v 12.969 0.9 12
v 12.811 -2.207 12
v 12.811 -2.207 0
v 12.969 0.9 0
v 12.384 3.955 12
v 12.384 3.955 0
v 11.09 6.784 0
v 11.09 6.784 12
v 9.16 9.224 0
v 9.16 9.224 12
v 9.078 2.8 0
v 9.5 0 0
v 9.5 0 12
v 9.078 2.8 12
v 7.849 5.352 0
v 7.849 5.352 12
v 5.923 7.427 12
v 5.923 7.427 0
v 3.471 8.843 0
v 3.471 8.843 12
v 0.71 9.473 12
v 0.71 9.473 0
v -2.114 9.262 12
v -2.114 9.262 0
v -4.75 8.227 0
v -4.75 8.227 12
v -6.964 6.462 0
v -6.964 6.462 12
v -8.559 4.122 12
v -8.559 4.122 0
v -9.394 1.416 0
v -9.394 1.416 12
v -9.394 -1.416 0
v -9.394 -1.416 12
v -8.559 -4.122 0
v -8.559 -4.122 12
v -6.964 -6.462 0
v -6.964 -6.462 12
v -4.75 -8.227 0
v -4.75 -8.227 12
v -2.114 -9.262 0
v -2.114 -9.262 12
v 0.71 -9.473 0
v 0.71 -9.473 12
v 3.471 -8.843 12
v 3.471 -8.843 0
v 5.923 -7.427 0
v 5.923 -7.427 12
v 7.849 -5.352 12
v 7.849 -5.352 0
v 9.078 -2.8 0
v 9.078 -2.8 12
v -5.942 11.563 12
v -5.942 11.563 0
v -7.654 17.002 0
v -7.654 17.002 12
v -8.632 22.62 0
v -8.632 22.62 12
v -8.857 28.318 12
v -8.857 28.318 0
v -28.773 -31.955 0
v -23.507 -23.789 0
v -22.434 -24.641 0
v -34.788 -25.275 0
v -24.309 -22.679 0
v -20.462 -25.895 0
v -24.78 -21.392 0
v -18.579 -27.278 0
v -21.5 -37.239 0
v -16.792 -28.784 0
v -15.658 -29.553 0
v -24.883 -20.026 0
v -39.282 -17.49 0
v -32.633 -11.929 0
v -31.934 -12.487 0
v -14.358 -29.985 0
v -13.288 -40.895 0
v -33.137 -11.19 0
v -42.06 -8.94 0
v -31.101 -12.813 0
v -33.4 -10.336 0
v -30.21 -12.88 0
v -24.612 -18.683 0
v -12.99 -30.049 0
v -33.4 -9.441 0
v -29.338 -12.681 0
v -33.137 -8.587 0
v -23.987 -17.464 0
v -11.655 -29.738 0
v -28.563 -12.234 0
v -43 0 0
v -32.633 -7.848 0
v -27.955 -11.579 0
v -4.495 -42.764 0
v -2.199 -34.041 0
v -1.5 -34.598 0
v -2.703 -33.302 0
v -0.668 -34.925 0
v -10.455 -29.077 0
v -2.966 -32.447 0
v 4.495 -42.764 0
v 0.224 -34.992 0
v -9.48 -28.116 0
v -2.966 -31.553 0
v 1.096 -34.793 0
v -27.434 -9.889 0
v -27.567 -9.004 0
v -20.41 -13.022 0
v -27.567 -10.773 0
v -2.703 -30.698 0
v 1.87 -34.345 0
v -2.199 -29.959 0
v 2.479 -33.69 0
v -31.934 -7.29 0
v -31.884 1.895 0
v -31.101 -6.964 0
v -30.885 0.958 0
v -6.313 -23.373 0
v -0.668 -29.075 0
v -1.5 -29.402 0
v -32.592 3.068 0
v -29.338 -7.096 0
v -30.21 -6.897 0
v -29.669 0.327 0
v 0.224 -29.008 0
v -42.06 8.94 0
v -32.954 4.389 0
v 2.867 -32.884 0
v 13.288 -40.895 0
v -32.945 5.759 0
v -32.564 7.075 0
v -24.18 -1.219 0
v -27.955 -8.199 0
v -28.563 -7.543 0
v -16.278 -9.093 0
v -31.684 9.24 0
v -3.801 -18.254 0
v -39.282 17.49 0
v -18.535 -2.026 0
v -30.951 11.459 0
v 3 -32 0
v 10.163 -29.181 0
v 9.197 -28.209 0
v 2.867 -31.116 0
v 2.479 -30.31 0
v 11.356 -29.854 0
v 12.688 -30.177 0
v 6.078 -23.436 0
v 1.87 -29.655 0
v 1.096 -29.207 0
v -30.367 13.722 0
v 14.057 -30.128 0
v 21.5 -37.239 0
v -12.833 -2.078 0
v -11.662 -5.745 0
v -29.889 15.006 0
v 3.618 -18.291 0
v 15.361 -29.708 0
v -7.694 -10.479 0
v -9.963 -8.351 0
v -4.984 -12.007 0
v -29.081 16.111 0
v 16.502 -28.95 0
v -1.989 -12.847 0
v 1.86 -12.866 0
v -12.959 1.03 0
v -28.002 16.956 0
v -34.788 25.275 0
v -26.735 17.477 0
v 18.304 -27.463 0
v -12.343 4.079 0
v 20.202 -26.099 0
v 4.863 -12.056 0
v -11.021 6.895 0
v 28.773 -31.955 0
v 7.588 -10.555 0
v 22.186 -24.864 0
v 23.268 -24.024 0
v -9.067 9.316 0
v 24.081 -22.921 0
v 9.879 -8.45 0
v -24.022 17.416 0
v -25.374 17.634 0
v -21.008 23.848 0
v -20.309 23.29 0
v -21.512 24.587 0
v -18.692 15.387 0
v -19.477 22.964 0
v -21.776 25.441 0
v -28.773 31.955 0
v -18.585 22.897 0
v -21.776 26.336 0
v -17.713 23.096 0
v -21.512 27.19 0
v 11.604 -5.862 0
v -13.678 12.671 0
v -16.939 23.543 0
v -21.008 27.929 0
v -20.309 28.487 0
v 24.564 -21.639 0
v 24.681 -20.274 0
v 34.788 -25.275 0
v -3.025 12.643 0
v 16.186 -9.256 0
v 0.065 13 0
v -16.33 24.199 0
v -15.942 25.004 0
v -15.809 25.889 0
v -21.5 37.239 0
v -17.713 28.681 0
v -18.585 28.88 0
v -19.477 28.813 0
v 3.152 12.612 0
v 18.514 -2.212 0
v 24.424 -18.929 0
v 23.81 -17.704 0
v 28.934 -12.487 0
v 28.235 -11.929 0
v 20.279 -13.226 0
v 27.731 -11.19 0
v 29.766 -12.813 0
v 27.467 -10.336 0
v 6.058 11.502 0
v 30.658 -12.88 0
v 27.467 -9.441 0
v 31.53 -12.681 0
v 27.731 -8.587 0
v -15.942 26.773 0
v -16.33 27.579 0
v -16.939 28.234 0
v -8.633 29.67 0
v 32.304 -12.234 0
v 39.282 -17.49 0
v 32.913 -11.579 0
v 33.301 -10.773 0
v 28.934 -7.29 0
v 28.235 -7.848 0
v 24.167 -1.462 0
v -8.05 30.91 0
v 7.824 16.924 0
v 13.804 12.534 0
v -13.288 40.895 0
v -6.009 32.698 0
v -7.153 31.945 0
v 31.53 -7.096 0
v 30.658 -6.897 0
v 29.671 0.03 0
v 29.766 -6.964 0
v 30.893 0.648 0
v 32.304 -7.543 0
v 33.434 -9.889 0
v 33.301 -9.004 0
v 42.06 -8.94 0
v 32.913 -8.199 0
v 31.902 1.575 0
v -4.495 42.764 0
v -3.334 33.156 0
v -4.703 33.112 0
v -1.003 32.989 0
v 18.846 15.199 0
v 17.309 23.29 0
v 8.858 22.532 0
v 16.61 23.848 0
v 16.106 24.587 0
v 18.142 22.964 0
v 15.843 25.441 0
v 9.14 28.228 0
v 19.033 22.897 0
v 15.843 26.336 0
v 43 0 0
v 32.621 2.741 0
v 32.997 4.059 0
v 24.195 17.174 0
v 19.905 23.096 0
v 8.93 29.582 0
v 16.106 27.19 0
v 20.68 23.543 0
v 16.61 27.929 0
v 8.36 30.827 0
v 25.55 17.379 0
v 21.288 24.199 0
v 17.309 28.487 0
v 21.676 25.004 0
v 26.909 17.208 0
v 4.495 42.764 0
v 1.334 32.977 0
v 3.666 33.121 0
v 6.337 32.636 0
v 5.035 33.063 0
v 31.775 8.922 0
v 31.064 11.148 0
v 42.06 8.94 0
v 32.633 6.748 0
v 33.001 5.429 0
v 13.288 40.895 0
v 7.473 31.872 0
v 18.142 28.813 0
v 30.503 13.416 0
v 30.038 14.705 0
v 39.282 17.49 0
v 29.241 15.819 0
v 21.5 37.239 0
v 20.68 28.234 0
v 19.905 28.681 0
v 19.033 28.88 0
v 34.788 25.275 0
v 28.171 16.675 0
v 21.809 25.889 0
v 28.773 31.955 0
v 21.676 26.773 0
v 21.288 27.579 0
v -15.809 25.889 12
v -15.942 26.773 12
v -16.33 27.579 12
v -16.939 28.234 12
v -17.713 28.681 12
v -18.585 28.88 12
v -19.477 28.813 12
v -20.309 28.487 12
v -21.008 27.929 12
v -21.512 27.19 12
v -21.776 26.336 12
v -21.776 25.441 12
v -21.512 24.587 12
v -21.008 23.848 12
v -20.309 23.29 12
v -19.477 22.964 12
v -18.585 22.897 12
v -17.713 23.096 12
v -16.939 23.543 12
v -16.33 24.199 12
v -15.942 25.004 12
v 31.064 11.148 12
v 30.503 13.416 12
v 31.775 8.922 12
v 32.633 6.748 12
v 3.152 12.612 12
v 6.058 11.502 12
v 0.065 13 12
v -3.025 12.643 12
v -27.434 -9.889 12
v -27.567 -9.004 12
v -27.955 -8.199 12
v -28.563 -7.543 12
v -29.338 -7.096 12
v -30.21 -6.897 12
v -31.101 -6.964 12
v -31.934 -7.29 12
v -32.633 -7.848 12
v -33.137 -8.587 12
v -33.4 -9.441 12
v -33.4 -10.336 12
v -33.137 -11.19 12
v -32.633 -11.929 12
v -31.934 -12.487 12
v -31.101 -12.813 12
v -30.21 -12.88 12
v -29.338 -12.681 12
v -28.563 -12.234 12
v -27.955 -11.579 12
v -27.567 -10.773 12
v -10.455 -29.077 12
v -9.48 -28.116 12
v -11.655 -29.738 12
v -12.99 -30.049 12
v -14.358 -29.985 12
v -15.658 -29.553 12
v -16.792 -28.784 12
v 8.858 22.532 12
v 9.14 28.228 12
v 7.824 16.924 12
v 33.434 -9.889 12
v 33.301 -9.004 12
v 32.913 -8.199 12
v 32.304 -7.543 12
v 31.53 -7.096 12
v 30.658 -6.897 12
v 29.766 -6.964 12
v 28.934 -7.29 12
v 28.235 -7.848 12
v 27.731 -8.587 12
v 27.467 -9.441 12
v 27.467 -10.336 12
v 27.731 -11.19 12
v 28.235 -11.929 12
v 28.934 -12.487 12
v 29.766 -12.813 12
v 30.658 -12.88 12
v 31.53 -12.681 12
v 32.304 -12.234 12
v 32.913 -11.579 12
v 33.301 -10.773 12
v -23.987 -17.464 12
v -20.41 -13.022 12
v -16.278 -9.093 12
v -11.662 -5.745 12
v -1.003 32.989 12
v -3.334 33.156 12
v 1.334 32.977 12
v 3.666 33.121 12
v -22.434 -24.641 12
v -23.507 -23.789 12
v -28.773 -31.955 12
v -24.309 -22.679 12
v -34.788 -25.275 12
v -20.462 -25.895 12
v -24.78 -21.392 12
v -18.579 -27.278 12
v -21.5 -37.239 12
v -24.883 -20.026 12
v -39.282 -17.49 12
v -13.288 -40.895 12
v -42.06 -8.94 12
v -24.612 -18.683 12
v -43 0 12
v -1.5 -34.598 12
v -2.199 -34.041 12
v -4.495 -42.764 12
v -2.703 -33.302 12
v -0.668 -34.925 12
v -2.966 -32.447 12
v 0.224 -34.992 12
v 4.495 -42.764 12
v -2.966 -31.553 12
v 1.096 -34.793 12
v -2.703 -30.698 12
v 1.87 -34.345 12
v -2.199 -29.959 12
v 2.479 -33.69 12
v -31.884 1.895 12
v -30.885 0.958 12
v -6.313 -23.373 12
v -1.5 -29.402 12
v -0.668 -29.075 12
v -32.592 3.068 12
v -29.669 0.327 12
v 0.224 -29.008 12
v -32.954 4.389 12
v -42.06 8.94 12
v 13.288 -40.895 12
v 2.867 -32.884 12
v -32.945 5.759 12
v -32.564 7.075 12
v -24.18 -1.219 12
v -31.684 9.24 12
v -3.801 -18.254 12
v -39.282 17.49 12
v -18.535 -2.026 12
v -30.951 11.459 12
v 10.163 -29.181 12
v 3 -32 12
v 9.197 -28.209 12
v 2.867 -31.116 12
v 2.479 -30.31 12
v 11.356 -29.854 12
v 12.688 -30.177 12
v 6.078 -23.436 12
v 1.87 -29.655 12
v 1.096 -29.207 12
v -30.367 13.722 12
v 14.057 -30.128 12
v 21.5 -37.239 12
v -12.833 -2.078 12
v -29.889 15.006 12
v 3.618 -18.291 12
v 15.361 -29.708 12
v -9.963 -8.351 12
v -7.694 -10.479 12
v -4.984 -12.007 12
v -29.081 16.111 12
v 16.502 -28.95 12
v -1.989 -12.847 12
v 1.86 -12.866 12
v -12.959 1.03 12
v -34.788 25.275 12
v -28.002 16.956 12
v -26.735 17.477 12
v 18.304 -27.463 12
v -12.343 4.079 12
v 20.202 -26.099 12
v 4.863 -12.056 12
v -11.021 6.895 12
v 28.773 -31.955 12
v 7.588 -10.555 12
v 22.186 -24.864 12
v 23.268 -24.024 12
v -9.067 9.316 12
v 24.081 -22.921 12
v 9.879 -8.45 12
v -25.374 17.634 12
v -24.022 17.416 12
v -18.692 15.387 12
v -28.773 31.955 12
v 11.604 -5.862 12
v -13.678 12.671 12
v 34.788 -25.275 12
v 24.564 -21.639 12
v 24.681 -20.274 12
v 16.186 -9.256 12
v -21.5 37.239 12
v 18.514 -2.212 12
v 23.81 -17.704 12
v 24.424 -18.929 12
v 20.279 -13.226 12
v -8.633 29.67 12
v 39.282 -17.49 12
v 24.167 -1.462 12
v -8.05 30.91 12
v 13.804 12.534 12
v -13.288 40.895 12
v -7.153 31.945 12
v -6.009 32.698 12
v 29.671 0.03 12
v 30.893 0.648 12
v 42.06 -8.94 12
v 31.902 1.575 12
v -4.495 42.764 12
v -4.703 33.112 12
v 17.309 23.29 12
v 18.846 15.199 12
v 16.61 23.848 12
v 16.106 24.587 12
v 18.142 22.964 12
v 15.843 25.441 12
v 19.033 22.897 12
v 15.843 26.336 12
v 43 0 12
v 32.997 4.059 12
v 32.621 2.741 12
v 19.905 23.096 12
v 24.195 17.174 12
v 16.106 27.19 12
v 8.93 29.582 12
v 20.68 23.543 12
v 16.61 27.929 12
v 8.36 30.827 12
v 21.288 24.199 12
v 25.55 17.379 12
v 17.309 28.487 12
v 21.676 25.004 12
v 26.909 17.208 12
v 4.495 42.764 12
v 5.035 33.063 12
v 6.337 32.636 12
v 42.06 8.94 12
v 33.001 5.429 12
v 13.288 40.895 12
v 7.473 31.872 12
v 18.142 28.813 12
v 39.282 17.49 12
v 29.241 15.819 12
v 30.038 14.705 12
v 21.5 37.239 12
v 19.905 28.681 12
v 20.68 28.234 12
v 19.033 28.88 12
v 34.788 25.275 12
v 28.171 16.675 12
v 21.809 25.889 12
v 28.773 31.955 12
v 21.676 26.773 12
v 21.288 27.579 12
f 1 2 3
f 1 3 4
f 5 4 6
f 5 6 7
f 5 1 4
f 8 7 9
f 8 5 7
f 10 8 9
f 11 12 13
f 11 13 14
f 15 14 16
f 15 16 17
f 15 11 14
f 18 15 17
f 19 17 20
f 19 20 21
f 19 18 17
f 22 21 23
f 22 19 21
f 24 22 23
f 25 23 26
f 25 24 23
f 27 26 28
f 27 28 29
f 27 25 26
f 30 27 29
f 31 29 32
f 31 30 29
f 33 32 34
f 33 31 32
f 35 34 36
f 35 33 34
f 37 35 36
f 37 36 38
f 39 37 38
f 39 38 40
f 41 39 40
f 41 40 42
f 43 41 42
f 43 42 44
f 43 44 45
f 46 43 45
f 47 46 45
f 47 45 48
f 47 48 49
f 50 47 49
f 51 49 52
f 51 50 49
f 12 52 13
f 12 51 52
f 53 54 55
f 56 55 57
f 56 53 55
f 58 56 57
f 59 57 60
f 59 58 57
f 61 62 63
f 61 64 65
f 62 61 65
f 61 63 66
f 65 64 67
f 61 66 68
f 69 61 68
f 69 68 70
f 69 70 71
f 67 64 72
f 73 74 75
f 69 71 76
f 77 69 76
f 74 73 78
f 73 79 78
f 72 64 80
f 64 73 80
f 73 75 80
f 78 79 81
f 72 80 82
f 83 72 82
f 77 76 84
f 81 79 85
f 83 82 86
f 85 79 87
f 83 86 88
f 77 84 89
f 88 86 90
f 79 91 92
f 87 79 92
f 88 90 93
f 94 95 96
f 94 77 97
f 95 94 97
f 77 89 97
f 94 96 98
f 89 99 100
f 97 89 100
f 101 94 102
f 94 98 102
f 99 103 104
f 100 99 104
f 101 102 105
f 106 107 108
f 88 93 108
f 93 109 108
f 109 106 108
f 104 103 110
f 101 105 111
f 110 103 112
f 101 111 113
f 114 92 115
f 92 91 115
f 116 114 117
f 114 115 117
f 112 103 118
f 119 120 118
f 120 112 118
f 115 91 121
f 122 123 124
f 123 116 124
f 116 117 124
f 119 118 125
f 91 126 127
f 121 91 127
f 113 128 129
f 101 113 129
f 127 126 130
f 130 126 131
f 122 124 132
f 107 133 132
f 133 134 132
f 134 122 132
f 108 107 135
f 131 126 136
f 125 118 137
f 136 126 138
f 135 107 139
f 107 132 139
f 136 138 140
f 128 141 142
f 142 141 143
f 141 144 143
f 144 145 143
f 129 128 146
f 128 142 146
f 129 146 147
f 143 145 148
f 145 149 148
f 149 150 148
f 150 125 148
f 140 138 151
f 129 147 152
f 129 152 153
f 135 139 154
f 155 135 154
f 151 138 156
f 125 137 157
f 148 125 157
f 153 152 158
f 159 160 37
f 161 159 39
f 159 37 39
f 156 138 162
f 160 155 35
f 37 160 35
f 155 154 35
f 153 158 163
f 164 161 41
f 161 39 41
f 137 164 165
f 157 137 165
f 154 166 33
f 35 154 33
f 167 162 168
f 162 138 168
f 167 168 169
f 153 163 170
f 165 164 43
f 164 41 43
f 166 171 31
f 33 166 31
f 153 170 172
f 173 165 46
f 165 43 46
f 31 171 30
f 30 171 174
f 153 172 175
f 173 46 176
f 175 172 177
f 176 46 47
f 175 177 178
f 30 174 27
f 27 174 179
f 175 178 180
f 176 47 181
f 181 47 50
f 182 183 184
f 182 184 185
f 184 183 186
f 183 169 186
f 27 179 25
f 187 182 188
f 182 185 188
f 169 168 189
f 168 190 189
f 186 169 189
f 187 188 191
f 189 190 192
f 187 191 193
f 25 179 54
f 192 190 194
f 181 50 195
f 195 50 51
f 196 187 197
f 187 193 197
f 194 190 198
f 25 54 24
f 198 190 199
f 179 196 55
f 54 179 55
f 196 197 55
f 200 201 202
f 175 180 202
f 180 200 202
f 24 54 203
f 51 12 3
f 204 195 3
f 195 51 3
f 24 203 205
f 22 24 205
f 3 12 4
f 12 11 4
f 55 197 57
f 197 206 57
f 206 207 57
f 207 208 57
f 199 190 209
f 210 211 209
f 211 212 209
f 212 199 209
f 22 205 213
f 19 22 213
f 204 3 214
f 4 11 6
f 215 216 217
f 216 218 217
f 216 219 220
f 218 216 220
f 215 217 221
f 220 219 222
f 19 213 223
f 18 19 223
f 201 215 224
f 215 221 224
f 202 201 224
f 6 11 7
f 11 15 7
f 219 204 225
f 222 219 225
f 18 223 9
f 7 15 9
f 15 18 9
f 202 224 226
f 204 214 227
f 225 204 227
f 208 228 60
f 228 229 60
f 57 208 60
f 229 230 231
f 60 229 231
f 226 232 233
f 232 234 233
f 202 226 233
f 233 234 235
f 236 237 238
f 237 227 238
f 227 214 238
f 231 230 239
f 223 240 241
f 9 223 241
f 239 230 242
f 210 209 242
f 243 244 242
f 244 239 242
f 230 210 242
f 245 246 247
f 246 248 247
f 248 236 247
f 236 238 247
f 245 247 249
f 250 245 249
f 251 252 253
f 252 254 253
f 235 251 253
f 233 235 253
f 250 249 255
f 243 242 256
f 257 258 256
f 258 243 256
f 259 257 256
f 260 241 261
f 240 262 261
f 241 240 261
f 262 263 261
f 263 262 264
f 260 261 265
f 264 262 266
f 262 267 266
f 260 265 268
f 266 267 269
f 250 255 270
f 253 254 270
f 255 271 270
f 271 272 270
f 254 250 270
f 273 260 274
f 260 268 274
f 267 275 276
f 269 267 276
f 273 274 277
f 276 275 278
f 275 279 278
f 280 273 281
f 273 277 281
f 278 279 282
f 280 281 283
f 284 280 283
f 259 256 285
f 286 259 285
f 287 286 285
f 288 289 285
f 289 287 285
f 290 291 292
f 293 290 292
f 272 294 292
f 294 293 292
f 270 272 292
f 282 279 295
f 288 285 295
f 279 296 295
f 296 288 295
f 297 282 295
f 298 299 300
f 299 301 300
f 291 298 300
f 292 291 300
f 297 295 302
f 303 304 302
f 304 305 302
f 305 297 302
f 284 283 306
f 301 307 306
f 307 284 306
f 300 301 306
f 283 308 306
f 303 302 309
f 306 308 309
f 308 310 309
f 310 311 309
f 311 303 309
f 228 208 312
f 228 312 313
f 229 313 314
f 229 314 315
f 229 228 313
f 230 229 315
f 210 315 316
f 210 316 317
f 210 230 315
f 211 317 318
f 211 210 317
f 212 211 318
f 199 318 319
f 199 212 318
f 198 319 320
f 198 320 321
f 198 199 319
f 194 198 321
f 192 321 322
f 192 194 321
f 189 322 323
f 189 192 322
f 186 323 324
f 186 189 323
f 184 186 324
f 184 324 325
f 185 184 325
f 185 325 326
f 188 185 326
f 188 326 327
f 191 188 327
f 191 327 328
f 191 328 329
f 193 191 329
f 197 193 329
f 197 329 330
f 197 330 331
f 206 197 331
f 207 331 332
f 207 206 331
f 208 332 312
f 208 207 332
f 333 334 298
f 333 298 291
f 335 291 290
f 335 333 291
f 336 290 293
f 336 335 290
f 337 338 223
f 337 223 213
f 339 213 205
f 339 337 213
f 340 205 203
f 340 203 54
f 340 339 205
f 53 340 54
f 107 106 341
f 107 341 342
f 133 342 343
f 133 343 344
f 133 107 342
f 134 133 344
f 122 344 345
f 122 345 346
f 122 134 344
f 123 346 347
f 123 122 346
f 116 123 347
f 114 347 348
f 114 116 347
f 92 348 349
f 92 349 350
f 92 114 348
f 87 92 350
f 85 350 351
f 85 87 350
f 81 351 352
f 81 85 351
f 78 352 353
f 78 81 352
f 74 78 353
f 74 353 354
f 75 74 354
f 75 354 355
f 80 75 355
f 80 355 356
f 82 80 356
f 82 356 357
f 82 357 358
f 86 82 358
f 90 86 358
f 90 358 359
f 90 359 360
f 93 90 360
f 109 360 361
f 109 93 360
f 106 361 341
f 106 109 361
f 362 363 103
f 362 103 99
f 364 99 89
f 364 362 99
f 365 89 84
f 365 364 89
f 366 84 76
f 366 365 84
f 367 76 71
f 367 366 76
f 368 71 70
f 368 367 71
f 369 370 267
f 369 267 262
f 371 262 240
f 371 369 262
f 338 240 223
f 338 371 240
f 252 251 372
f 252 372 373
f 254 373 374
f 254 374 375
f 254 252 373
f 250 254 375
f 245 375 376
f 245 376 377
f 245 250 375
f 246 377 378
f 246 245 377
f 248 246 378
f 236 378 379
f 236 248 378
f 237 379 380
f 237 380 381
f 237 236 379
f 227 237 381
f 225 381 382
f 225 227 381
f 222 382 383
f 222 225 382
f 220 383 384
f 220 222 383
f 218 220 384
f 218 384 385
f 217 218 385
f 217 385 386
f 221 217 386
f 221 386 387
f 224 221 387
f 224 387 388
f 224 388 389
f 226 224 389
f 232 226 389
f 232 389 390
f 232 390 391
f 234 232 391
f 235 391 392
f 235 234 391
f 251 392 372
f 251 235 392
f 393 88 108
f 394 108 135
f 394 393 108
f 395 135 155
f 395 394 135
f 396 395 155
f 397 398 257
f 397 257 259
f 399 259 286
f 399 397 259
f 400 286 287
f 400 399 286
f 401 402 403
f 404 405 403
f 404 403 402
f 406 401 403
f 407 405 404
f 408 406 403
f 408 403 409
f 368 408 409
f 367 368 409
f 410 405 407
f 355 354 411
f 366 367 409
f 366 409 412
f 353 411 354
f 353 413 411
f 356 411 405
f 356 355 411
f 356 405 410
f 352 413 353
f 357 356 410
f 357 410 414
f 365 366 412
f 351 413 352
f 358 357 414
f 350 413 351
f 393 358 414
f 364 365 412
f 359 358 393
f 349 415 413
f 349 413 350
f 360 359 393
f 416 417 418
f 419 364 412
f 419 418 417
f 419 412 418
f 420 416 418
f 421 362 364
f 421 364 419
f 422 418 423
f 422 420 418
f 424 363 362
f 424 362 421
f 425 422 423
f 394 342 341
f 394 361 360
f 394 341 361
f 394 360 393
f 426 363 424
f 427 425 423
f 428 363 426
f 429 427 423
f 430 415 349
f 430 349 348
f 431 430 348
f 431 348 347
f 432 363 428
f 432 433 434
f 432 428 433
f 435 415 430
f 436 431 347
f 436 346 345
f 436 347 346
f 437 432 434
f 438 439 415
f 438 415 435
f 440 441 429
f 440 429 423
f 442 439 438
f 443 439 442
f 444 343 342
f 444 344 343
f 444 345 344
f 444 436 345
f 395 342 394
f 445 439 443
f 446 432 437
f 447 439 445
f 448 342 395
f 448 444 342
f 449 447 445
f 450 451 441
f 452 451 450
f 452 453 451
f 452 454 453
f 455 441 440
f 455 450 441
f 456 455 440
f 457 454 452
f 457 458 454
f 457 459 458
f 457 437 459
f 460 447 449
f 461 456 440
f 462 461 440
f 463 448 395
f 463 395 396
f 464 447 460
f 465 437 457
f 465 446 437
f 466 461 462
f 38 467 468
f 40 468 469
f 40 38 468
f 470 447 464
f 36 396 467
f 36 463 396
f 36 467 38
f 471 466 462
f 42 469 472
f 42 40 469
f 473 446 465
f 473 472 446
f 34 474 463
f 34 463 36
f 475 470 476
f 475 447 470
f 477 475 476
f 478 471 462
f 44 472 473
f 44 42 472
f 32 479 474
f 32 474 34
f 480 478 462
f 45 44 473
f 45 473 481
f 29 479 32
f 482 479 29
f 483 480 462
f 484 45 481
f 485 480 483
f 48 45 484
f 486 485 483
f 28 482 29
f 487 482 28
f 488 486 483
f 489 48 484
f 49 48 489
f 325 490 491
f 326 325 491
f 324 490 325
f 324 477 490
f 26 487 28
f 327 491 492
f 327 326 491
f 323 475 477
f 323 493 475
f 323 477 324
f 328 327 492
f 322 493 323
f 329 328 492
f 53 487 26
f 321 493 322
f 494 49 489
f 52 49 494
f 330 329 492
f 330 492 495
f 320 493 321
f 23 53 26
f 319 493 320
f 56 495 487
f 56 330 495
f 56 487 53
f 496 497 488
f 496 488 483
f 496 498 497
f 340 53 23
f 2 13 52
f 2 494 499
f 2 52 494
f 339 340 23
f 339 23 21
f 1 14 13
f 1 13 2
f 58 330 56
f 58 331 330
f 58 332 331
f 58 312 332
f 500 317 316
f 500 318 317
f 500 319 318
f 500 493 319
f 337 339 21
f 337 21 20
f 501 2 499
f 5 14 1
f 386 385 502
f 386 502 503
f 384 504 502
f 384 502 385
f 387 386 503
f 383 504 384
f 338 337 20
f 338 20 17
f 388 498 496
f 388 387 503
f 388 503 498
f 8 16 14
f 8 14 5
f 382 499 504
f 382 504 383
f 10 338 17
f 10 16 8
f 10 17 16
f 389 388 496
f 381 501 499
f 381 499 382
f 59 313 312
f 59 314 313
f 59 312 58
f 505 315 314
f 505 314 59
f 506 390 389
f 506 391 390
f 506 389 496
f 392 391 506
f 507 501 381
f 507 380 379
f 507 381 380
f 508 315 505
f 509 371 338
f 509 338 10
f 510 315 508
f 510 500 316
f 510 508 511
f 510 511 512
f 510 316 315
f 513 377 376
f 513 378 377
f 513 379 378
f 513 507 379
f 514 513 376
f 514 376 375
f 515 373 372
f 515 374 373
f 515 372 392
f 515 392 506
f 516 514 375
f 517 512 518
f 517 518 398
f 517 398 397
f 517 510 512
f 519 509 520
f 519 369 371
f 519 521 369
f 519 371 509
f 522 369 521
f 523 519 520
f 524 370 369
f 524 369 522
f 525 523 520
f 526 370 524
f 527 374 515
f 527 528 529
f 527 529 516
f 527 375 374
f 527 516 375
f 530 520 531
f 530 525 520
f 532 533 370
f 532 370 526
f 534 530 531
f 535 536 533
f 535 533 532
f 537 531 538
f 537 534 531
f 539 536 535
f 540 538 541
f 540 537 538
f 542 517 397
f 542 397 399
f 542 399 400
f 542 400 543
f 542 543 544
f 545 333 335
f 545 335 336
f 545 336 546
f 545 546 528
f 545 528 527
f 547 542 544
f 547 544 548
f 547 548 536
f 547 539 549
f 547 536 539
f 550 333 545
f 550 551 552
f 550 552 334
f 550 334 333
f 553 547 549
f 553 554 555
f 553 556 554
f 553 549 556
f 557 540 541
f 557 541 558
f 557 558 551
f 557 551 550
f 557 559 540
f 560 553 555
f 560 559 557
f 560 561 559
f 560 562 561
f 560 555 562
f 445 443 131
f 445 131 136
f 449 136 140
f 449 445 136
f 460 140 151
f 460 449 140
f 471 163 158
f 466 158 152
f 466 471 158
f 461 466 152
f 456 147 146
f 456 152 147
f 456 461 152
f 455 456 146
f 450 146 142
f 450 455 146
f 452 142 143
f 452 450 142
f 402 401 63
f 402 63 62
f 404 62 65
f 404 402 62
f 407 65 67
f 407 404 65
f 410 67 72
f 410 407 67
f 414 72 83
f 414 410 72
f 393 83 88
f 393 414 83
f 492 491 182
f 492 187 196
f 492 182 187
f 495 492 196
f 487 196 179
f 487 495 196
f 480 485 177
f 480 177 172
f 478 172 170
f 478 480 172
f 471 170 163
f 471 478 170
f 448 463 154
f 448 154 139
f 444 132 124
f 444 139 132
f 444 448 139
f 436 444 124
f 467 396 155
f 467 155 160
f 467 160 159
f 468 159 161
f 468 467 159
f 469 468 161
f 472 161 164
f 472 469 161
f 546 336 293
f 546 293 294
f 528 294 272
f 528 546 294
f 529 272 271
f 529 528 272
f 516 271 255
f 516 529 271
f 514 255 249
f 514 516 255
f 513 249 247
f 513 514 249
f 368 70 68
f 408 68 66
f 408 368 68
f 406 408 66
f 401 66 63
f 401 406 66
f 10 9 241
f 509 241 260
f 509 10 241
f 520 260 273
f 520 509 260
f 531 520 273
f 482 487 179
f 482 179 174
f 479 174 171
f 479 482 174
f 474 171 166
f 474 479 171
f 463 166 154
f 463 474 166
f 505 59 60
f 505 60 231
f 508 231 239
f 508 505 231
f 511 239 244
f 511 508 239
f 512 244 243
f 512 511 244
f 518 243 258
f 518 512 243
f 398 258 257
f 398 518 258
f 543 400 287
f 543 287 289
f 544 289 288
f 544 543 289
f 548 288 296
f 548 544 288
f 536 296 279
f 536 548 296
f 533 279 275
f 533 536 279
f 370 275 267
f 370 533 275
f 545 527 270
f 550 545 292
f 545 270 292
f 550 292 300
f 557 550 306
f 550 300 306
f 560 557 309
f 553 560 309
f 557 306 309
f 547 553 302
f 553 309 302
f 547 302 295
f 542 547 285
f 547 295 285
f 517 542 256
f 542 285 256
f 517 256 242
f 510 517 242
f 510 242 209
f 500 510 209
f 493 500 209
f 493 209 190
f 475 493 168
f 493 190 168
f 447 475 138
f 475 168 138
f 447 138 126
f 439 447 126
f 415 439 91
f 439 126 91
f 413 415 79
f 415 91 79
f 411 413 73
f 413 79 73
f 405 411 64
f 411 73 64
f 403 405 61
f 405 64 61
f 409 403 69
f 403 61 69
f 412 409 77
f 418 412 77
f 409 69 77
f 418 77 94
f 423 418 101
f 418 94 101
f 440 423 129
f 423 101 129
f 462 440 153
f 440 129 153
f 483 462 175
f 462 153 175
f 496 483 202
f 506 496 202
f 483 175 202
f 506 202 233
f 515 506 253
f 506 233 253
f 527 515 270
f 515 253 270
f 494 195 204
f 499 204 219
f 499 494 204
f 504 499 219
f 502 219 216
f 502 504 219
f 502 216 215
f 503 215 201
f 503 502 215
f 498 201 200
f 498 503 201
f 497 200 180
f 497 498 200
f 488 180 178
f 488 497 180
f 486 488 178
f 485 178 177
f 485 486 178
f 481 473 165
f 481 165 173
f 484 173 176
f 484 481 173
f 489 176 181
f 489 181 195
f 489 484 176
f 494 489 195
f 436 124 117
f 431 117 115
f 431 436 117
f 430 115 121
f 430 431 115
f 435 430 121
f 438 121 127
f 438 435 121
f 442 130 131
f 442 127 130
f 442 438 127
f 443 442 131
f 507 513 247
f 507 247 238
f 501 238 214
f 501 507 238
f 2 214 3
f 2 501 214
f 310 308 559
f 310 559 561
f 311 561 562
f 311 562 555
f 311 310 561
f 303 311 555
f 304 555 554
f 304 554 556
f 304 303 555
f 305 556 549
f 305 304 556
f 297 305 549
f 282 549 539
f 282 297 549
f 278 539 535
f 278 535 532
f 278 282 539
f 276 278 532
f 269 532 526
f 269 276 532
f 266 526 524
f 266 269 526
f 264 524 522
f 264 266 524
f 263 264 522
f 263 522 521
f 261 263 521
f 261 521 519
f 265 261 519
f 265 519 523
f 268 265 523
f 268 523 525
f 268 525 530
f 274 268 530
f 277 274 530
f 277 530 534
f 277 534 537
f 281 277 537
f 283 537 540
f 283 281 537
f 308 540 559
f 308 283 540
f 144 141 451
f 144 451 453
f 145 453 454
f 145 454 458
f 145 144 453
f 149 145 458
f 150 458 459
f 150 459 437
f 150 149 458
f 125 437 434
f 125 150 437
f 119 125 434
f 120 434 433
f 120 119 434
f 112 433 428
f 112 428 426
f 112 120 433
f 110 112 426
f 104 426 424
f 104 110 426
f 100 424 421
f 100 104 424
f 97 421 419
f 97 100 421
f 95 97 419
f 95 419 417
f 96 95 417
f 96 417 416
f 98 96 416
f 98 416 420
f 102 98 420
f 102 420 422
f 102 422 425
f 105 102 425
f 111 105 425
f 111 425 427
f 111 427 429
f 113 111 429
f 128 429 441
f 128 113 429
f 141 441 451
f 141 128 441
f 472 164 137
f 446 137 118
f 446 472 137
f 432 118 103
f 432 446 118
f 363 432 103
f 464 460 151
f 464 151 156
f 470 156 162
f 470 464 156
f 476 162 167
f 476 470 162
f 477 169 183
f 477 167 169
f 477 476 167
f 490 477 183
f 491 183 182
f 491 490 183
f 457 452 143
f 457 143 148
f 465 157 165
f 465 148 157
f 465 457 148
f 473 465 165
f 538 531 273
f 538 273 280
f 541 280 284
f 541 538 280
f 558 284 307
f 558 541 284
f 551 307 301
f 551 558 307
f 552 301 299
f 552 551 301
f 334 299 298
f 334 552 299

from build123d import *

# Parameters (mm, degrees)
SKETCH_1_R          = 43
SKETCH_1_R_2        = 9.5
SKETCH_1_R_3        = 3
EXTRUDE_1_DEPTH     = 12
CUT_EXTRUDE_1_DEPTH = 62.983868869


with BuildPart() as part:
    # 草图1 → 凸台-拉伸1 (new body)
    with BuildSketch(Plane.XY):
        Circle(SKETCH_1_R)
        Circle(SKETCH_1_R_2, mode=Mode.SUBTRACT)
        with Locations((0, -32)):
            Circle(SKETCH_1_R_3, mode=Mode.SUBTRACT)
        with Locations((-30.433808521, -9.88854382)):
            Circle(SKETCH_1_R_3, mode=Mode.SUBTRACT)
        with Locations((-18.809128073, 25.88854382)):
            Circle(SKETCH_1_R_3, mode=Mode.SUBTRACT)
        with Locations((18.809128073, 25.88854382)):
            Circle(SKETCH_1_R_3, mode=Mode.SUBTRACT)
        with Locations((30.433808521, -9.88854382)):
            Circle(SKETCH_1_R_3, mode=Mode.SUBTRACT)
    extrude(amount=EXTRUDE_1_DEPTH)

    # 草图2 → 切除-拉伸1 (cut, through all)
    with BuildSketch(Plane.XY.offset(12)):
        with BuildLine():
            ThreePointArc((-9.067424527, 9.315675631), (-12.343438055, 4.079158859), (-12.832801935, -2.078267189))
            ThreePointArc((-12.832801935, -2.078267189), (-21.37101475, -1.716157168), (-29.668995358, 0.32730058))
            ThreePointArc((-29.668995358, 0.32730058), (-32.591945887, 3.068256778), (-32.563681076, 7.075210954))
            ThreePointArc((-32.563681076, 7.075210954), (-31.298866838, 10.343394552), (-30.367210921, 13.721677599))
            ThreePointArc((-30.367210921, 13.721677599), (-28.002294185, 16.956434081), (-24.021676007, 17.415955129))
            ThreePointArc((-24.021676007, 17.415955129), (-16.140082755, 14.112519106), (-9.067424527, 9.315675631))
        make_face()
        with BuildLine():
            ThreePointArc((-5.942103436, 11.562500022), (-8.236169203, 19.794721108), (-8.856942422, 28.318032809))
            ThreePointArc((-8.856942422, 28.318032809), (-7.153379557, 31.944926002), (-3.33380537, 33.156261505))
            ThreePointArc((-3.33380537, 33.156261505), (0.165271032, 32.963275955), (3.666106648, 33.121165398))
            ThreePointArc((3.666106648, 33.121165398), (7.473342341, 31.871590651), (9.140451493, 28.227797607))
            ThreePointArc((9.140451493, 28.227797607), (8.434243395, 19.711139115), (6.057745738, 11.502335266))
            ThreePointArc((6.057745738, 11.502335266), (0.065178486, 12.999836605), (-5.942103436, 11.562500022))
        make_face()
        with BuildLine():
            ThreePointArc((30.503276045, 13.416485596), (31.401009953, 10.029030369), (32.632989436, 6.748328364))
            ThreePointArc((32.632989436, 6.748328364), (32.621073761, 2.741292217), (29.670785702, 0.02978322))
            ThreePointArc((29.670785702, 0.02978322), (21.352731843, -1.930365176), (12.811317288, -2.206841486))
            ThreePointArc((12.811317288, -2.206841486), (12.383720574, 3.955182012), (9.160380047, 9.224285197))
            ThreePointArc((9.160380047, 9.224285197), (16.280782246, 13.949967611), (24.195103905, 17.17420619))
            ThreePointArc((24.195103905, 17.17420619), (28.170914186, 16.674793259), (30.503276045, 13.416485596))
        make_face()
        with BuildLine():
            ThreePointArc((22.185866734, -24.864417397), (19.2416204, -26.764994313), (16.502189978, -28.950469101))
            ThreePointArc((16.502189978, -28.950469101), (12.687589993, -30.177378887), (9.197102544, -28.209390565))
            ThreePointArc((9.197102544, -28.209390565), (4.762470636, -20.904170405), (1.860083786, -12.866238312))
            ThreePointArc((1.860083786, -12.866238312), (7.588381736, -10.55539969), (11.603529654, -5.861578248))
            ThreePointArc((11.603529654, -5.861578248), (18.298245994, -11.173166982), (23.810338997, -17.703789654))
            ThreePointArc((23.810338997, -17.703789654), (24.563962018, -21.639337012), (22.185866734, -24.864417397))
        make_face()
        with BuildLine():
            ThreePointArc((-16.791656334, -28.783540658), (-19.509034547, -26.570706563), (-22.434075141, -24.640702259))
            ThreePointArc((-22.434075141, -24.640702259), (-24.77971191, -21.391938061), (-23.986663732, -17.464145391))
            ThreePointArc((-23.986663732, -17.464145391), (-18.409363119, -10.98912264), (-11.661722286, -5.744931098))
            ThreePointArc((-11.661722286, -5.744931098), (-7.693842741, -10.478777785), (-1.989004331, -12.846939782))
            ThreePointArc((-1.989004331, -12.846939782), (-4.971844287, -20.855364568), (-9.479505121, -28.115749926))
            ThreePointArc((-9.479505121, -28.115749926), (-12.989550761, -30.048639027), (-16.791656334, -28.783540658))
        make_face()
    extrude(amount=-CUT_EXTRUDE_1_DEPTH, mode=Mode.SUBTRACT)


solid = part.part
